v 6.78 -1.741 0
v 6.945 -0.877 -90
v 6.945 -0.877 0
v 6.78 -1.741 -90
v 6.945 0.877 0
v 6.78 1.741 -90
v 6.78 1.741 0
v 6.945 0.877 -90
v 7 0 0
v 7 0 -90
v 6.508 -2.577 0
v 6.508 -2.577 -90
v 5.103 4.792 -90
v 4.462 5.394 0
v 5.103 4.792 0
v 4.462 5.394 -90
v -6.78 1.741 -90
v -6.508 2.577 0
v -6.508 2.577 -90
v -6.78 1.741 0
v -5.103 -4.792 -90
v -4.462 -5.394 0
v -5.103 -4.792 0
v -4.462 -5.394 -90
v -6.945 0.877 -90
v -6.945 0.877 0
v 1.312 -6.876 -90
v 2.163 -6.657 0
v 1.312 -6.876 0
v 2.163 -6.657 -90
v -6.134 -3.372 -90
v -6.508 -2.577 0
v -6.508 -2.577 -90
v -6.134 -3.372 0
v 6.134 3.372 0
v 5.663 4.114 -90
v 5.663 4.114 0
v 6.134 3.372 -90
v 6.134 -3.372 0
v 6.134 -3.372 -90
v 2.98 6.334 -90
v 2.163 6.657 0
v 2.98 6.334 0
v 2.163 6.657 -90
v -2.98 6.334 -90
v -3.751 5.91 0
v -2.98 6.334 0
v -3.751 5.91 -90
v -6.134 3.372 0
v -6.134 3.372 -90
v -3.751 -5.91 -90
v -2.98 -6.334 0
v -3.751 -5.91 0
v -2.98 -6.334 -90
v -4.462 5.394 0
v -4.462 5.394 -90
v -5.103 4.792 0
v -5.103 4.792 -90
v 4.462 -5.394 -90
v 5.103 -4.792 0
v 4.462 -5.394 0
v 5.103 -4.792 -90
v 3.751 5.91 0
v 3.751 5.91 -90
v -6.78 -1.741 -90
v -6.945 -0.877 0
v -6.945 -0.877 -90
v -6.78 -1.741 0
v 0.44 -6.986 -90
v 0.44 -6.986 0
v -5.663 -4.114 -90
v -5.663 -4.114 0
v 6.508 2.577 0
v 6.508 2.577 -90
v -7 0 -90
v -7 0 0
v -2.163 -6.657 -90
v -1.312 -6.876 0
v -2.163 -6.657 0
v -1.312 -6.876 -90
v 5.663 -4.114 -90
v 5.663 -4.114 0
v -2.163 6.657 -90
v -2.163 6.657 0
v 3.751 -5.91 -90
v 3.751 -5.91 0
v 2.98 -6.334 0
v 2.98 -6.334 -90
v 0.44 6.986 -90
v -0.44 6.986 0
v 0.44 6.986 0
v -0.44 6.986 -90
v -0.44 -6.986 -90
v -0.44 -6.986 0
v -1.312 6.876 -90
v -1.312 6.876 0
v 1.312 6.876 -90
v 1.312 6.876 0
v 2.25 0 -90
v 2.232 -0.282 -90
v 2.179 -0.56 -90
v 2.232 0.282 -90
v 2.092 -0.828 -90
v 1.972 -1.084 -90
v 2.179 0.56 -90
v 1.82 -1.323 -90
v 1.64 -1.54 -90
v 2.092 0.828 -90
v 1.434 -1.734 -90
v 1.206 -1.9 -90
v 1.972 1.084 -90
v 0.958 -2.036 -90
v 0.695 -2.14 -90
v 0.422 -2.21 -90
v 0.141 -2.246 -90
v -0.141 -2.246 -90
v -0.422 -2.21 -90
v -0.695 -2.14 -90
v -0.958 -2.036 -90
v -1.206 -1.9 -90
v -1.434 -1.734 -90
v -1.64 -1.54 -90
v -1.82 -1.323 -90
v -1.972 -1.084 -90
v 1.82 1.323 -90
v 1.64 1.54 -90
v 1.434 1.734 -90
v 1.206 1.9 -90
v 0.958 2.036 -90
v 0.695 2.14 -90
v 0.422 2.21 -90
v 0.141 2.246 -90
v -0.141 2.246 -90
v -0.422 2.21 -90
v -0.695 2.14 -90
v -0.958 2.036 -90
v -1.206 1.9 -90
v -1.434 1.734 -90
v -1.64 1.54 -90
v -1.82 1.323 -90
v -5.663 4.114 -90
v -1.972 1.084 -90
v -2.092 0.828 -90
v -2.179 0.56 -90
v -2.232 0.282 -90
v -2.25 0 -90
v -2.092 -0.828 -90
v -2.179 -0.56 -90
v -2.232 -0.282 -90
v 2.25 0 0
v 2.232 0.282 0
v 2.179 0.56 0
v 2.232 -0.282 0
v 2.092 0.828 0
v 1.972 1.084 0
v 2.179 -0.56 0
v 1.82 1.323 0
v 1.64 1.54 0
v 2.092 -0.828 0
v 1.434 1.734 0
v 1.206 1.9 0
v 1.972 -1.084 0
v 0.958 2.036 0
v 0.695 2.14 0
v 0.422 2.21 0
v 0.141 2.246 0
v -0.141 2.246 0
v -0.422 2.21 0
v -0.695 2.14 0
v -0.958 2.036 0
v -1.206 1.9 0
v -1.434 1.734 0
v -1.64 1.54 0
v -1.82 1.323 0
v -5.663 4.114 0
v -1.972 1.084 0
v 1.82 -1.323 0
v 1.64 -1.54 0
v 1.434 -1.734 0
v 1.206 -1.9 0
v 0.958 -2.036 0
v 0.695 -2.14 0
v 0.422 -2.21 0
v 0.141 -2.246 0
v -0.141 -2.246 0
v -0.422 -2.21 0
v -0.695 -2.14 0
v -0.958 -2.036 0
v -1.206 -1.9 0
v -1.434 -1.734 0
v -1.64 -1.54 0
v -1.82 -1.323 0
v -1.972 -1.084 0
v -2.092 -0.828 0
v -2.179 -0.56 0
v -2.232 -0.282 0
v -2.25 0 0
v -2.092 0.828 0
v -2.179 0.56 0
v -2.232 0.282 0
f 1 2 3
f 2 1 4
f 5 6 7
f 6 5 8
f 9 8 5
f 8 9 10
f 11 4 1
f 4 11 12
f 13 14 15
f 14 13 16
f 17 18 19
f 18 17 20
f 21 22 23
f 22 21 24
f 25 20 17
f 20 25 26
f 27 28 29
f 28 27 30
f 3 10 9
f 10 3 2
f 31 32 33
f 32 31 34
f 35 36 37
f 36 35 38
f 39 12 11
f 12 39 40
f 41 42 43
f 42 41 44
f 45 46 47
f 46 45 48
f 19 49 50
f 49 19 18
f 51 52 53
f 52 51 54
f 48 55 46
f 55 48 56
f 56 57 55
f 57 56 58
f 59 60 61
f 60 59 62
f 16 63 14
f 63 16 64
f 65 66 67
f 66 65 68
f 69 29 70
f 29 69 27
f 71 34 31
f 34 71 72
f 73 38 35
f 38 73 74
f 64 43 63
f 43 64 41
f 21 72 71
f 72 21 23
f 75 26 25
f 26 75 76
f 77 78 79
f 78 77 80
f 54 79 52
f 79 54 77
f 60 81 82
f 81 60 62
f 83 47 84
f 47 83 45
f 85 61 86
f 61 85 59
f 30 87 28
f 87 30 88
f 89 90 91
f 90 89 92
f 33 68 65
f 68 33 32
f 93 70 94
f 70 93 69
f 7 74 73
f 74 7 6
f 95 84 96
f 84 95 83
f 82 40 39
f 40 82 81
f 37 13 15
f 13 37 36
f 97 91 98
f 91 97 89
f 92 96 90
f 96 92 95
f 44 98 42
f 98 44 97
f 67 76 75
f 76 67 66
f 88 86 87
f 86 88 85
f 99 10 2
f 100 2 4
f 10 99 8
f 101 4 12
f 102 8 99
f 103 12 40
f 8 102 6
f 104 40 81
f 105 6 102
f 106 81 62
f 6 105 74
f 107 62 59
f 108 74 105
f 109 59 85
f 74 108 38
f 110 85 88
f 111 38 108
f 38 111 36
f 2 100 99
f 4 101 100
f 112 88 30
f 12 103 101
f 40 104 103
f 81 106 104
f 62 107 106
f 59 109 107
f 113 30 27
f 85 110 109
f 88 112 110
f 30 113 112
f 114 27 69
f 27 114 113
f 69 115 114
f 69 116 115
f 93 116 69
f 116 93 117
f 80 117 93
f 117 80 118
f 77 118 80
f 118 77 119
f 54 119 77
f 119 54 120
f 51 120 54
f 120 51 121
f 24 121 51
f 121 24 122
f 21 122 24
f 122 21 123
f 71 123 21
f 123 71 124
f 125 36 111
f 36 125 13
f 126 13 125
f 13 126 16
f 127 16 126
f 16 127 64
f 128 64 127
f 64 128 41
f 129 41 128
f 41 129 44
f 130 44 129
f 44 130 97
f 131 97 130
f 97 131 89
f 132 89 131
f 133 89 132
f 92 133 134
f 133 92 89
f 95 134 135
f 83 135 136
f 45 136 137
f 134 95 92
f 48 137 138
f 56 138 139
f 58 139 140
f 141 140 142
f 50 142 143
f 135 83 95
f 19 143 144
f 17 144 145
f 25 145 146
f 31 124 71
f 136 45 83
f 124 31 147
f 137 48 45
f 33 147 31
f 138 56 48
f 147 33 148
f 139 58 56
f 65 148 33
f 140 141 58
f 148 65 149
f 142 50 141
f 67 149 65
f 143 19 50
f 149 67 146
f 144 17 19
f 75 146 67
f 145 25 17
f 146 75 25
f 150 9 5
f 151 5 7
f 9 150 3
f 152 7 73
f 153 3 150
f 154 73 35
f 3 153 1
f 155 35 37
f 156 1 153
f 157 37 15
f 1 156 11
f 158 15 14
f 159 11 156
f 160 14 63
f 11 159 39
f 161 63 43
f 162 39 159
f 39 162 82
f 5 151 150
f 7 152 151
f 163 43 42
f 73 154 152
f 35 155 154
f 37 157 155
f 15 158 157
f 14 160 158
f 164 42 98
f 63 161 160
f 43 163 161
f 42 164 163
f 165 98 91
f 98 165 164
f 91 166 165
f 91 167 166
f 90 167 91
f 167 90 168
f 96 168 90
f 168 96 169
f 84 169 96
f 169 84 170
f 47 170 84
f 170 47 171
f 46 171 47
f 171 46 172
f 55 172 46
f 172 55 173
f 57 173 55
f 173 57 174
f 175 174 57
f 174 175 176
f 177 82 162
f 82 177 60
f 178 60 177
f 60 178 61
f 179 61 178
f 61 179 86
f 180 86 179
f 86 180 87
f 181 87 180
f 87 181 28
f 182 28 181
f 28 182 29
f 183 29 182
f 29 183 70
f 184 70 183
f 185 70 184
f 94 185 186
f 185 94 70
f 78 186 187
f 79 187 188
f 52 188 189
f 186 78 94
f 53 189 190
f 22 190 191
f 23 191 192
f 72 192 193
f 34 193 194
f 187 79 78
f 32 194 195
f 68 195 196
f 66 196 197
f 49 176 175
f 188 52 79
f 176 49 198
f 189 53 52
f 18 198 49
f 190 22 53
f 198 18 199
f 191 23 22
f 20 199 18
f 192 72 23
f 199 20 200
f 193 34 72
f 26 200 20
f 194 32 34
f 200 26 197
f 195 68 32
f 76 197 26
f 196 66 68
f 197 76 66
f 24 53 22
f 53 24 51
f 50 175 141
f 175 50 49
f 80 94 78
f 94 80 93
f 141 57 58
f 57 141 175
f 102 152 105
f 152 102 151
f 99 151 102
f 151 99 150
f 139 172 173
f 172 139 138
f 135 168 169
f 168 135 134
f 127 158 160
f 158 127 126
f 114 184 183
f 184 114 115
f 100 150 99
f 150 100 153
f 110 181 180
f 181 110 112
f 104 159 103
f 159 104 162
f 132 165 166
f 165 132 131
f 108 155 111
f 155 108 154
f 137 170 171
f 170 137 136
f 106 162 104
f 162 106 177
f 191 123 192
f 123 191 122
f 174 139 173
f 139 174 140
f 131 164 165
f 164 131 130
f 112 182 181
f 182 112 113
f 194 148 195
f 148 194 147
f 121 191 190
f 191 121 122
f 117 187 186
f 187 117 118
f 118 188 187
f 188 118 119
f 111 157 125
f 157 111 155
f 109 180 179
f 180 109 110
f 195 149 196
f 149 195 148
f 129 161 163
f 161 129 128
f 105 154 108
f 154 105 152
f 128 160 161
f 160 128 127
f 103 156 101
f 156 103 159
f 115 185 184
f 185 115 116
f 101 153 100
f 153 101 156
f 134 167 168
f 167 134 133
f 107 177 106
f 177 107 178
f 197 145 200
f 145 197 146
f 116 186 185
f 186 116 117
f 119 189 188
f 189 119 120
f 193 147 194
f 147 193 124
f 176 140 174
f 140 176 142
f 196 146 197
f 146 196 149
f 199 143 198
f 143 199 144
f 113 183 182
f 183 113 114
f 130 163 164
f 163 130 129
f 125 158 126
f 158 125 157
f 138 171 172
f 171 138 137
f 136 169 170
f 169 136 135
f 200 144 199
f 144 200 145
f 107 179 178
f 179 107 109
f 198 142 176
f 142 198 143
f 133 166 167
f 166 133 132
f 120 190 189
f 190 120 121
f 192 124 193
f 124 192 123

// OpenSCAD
$fn = 50;


difference() {
	union() {
		translate(v = [0, 0, -90.0000000000]) {
			cylinder(h = 90, r = 7.0000000000);
		}
		cylinder(h = 0, r = 10.0000000000);
	}
	union() {
		#translate(v = [0, 0, -90]) {
			cylinder(h = 90, r = 2.2500000000);
		}
	}
}
